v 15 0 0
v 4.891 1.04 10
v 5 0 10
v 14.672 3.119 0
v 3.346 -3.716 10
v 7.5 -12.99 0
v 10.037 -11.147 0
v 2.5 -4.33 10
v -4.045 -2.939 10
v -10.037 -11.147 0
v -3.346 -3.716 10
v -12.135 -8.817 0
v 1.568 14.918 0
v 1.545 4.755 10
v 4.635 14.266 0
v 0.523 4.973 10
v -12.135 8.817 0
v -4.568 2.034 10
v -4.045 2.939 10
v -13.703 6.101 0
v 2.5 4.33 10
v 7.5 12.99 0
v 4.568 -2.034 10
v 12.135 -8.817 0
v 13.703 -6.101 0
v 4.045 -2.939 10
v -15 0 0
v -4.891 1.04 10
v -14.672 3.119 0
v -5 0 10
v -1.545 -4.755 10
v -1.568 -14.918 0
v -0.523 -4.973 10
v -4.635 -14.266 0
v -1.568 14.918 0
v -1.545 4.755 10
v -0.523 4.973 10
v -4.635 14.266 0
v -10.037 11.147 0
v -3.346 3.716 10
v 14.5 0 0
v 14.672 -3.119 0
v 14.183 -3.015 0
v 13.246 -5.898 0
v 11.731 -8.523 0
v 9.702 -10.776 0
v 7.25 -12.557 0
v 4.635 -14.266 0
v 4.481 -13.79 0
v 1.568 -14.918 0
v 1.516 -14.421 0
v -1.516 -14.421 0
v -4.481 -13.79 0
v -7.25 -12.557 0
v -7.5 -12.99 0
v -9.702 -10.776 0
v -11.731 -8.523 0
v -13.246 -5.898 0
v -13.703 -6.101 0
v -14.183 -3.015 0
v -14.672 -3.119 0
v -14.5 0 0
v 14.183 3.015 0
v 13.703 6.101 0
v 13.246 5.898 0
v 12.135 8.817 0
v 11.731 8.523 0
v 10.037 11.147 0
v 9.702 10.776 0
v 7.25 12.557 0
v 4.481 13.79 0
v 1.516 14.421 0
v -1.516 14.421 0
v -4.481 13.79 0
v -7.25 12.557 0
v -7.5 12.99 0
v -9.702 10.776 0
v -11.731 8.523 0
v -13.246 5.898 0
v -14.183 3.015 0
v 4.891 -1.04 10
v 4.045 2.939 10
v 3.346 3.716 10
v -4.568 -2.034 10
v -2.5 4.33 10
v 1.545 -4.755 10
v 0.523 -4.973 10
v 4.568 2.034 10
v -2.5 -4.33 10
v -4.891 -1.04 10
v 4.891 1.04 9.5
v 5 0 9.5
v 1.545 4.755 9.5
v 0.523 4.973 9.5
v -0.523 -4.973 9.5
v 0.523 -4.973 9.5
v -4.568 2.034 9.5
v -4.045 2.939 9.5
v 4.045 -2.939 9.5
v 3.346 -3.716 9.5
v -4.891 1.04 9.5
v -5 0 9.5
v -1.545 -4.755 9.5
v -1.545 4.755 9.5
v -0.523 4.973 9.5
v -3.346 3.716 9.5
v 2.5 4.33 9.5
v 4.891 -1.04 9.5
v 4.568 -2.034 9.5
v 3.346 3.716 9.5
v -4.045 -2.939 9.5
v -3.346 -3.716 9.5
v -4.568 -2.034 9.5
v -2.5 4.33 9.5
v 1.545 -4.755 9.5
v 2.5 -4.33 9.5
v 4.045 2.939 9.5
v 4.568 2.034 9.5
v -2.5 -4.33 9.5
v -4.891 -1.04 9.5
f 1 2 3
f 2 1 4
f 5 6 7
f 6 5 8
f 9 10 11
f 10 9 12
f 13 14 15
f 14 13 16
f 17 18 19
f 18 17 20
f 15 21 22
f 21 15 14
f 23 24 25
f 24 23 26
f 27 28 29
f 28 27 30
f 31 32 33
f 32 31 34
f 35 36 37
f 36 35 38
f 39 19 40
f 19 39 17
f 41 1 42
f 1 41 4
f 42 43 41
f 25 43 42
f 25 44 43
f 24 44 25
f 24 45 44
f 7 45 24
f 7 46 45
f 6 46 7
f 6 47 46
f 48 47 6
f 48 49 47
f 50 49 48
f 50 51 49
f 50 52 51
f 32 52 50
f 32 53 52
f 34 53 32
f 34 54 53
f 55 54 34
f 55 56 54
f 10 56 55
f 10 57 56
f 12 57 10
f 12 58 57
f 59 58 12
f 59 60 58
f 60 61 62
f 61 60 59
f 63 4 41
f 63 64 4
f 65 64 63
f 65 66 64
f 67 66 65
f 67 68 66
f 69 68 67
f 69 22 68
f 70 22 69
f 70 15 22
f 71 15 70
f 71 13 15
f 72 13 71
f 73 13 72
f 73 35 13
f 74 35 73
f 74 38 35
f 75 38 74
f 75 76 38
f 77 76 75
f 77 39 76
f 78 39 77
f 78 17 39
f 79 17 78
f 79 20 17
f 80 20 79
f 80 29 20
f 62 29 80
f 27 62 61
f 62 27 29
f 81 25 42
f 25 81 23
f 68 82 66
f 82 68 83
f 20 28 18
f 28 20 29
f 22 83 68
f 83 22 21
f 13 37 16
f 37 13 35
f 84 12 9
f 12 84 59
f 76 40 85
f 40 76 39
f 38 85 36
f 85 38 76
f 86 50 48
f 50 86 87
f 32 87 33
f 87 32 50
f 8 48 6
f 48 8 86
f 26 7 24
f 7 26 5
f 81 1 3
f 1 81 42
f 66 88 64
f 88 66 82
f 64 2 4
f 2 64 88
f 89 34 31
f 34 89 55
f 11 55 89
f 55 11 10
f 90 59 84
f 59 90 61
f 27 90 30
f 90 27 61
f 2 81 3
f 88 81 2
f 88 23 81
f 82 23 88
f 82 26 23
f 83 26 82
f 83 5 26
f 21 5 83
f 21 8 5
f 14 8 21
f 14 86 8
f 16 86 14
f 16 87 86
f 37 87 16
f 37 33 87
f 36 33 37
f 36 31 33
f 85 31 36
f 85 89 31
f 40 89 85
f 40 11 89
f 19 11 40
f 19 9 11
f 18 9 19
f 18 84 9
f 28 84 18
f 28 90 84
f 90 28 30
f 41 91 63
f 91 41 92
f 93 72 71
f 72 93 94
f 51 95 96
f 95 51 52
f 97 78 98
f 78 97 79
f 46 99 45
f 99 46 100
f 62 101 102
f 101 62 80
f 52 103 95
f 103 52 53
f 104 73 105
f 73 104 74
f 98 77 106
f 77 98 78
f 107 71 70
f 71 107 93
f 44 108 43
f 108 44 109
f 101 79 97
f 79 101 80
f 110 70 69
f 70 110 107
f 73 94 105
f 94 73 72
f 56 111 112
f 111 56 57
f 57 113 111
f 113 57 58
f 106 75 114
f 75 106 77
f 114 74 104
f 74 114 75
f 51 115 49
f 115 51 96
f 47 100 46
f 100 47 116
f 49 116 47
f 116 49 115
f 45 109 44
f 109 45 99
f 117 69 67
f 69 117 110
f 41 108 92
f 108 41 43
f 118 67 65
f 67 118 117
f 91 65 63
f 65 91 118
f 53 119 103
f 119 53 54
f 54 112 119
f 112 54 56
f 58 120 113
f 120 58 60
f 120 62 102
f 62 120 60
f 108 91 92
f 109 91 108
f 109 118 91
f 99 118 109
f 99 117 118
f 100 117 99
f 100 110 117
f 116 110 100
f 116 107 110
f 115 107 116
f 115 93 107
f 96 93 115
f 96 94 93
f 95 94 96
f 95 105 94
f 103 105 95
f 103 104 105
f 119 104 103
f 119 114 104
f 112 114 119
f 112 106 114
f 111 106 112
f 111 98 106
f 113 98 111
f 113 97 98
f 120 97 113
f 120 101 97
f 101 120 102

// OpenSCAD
r = 30/2;
h = 10;
thickness = 0.5;

difference() {
difference() {
  cylinder(r1 = r, r2 = 0, h = r);
  translate([0, 0, h])
    cylinder(r = r, h = r);
}

difference() {
  cylinder(r1 = r-thickness, r2 = 0, h = r-thickness);
 translate([0, 0, h-thickness])
    cylinder(r = r, h = r);
}
}
